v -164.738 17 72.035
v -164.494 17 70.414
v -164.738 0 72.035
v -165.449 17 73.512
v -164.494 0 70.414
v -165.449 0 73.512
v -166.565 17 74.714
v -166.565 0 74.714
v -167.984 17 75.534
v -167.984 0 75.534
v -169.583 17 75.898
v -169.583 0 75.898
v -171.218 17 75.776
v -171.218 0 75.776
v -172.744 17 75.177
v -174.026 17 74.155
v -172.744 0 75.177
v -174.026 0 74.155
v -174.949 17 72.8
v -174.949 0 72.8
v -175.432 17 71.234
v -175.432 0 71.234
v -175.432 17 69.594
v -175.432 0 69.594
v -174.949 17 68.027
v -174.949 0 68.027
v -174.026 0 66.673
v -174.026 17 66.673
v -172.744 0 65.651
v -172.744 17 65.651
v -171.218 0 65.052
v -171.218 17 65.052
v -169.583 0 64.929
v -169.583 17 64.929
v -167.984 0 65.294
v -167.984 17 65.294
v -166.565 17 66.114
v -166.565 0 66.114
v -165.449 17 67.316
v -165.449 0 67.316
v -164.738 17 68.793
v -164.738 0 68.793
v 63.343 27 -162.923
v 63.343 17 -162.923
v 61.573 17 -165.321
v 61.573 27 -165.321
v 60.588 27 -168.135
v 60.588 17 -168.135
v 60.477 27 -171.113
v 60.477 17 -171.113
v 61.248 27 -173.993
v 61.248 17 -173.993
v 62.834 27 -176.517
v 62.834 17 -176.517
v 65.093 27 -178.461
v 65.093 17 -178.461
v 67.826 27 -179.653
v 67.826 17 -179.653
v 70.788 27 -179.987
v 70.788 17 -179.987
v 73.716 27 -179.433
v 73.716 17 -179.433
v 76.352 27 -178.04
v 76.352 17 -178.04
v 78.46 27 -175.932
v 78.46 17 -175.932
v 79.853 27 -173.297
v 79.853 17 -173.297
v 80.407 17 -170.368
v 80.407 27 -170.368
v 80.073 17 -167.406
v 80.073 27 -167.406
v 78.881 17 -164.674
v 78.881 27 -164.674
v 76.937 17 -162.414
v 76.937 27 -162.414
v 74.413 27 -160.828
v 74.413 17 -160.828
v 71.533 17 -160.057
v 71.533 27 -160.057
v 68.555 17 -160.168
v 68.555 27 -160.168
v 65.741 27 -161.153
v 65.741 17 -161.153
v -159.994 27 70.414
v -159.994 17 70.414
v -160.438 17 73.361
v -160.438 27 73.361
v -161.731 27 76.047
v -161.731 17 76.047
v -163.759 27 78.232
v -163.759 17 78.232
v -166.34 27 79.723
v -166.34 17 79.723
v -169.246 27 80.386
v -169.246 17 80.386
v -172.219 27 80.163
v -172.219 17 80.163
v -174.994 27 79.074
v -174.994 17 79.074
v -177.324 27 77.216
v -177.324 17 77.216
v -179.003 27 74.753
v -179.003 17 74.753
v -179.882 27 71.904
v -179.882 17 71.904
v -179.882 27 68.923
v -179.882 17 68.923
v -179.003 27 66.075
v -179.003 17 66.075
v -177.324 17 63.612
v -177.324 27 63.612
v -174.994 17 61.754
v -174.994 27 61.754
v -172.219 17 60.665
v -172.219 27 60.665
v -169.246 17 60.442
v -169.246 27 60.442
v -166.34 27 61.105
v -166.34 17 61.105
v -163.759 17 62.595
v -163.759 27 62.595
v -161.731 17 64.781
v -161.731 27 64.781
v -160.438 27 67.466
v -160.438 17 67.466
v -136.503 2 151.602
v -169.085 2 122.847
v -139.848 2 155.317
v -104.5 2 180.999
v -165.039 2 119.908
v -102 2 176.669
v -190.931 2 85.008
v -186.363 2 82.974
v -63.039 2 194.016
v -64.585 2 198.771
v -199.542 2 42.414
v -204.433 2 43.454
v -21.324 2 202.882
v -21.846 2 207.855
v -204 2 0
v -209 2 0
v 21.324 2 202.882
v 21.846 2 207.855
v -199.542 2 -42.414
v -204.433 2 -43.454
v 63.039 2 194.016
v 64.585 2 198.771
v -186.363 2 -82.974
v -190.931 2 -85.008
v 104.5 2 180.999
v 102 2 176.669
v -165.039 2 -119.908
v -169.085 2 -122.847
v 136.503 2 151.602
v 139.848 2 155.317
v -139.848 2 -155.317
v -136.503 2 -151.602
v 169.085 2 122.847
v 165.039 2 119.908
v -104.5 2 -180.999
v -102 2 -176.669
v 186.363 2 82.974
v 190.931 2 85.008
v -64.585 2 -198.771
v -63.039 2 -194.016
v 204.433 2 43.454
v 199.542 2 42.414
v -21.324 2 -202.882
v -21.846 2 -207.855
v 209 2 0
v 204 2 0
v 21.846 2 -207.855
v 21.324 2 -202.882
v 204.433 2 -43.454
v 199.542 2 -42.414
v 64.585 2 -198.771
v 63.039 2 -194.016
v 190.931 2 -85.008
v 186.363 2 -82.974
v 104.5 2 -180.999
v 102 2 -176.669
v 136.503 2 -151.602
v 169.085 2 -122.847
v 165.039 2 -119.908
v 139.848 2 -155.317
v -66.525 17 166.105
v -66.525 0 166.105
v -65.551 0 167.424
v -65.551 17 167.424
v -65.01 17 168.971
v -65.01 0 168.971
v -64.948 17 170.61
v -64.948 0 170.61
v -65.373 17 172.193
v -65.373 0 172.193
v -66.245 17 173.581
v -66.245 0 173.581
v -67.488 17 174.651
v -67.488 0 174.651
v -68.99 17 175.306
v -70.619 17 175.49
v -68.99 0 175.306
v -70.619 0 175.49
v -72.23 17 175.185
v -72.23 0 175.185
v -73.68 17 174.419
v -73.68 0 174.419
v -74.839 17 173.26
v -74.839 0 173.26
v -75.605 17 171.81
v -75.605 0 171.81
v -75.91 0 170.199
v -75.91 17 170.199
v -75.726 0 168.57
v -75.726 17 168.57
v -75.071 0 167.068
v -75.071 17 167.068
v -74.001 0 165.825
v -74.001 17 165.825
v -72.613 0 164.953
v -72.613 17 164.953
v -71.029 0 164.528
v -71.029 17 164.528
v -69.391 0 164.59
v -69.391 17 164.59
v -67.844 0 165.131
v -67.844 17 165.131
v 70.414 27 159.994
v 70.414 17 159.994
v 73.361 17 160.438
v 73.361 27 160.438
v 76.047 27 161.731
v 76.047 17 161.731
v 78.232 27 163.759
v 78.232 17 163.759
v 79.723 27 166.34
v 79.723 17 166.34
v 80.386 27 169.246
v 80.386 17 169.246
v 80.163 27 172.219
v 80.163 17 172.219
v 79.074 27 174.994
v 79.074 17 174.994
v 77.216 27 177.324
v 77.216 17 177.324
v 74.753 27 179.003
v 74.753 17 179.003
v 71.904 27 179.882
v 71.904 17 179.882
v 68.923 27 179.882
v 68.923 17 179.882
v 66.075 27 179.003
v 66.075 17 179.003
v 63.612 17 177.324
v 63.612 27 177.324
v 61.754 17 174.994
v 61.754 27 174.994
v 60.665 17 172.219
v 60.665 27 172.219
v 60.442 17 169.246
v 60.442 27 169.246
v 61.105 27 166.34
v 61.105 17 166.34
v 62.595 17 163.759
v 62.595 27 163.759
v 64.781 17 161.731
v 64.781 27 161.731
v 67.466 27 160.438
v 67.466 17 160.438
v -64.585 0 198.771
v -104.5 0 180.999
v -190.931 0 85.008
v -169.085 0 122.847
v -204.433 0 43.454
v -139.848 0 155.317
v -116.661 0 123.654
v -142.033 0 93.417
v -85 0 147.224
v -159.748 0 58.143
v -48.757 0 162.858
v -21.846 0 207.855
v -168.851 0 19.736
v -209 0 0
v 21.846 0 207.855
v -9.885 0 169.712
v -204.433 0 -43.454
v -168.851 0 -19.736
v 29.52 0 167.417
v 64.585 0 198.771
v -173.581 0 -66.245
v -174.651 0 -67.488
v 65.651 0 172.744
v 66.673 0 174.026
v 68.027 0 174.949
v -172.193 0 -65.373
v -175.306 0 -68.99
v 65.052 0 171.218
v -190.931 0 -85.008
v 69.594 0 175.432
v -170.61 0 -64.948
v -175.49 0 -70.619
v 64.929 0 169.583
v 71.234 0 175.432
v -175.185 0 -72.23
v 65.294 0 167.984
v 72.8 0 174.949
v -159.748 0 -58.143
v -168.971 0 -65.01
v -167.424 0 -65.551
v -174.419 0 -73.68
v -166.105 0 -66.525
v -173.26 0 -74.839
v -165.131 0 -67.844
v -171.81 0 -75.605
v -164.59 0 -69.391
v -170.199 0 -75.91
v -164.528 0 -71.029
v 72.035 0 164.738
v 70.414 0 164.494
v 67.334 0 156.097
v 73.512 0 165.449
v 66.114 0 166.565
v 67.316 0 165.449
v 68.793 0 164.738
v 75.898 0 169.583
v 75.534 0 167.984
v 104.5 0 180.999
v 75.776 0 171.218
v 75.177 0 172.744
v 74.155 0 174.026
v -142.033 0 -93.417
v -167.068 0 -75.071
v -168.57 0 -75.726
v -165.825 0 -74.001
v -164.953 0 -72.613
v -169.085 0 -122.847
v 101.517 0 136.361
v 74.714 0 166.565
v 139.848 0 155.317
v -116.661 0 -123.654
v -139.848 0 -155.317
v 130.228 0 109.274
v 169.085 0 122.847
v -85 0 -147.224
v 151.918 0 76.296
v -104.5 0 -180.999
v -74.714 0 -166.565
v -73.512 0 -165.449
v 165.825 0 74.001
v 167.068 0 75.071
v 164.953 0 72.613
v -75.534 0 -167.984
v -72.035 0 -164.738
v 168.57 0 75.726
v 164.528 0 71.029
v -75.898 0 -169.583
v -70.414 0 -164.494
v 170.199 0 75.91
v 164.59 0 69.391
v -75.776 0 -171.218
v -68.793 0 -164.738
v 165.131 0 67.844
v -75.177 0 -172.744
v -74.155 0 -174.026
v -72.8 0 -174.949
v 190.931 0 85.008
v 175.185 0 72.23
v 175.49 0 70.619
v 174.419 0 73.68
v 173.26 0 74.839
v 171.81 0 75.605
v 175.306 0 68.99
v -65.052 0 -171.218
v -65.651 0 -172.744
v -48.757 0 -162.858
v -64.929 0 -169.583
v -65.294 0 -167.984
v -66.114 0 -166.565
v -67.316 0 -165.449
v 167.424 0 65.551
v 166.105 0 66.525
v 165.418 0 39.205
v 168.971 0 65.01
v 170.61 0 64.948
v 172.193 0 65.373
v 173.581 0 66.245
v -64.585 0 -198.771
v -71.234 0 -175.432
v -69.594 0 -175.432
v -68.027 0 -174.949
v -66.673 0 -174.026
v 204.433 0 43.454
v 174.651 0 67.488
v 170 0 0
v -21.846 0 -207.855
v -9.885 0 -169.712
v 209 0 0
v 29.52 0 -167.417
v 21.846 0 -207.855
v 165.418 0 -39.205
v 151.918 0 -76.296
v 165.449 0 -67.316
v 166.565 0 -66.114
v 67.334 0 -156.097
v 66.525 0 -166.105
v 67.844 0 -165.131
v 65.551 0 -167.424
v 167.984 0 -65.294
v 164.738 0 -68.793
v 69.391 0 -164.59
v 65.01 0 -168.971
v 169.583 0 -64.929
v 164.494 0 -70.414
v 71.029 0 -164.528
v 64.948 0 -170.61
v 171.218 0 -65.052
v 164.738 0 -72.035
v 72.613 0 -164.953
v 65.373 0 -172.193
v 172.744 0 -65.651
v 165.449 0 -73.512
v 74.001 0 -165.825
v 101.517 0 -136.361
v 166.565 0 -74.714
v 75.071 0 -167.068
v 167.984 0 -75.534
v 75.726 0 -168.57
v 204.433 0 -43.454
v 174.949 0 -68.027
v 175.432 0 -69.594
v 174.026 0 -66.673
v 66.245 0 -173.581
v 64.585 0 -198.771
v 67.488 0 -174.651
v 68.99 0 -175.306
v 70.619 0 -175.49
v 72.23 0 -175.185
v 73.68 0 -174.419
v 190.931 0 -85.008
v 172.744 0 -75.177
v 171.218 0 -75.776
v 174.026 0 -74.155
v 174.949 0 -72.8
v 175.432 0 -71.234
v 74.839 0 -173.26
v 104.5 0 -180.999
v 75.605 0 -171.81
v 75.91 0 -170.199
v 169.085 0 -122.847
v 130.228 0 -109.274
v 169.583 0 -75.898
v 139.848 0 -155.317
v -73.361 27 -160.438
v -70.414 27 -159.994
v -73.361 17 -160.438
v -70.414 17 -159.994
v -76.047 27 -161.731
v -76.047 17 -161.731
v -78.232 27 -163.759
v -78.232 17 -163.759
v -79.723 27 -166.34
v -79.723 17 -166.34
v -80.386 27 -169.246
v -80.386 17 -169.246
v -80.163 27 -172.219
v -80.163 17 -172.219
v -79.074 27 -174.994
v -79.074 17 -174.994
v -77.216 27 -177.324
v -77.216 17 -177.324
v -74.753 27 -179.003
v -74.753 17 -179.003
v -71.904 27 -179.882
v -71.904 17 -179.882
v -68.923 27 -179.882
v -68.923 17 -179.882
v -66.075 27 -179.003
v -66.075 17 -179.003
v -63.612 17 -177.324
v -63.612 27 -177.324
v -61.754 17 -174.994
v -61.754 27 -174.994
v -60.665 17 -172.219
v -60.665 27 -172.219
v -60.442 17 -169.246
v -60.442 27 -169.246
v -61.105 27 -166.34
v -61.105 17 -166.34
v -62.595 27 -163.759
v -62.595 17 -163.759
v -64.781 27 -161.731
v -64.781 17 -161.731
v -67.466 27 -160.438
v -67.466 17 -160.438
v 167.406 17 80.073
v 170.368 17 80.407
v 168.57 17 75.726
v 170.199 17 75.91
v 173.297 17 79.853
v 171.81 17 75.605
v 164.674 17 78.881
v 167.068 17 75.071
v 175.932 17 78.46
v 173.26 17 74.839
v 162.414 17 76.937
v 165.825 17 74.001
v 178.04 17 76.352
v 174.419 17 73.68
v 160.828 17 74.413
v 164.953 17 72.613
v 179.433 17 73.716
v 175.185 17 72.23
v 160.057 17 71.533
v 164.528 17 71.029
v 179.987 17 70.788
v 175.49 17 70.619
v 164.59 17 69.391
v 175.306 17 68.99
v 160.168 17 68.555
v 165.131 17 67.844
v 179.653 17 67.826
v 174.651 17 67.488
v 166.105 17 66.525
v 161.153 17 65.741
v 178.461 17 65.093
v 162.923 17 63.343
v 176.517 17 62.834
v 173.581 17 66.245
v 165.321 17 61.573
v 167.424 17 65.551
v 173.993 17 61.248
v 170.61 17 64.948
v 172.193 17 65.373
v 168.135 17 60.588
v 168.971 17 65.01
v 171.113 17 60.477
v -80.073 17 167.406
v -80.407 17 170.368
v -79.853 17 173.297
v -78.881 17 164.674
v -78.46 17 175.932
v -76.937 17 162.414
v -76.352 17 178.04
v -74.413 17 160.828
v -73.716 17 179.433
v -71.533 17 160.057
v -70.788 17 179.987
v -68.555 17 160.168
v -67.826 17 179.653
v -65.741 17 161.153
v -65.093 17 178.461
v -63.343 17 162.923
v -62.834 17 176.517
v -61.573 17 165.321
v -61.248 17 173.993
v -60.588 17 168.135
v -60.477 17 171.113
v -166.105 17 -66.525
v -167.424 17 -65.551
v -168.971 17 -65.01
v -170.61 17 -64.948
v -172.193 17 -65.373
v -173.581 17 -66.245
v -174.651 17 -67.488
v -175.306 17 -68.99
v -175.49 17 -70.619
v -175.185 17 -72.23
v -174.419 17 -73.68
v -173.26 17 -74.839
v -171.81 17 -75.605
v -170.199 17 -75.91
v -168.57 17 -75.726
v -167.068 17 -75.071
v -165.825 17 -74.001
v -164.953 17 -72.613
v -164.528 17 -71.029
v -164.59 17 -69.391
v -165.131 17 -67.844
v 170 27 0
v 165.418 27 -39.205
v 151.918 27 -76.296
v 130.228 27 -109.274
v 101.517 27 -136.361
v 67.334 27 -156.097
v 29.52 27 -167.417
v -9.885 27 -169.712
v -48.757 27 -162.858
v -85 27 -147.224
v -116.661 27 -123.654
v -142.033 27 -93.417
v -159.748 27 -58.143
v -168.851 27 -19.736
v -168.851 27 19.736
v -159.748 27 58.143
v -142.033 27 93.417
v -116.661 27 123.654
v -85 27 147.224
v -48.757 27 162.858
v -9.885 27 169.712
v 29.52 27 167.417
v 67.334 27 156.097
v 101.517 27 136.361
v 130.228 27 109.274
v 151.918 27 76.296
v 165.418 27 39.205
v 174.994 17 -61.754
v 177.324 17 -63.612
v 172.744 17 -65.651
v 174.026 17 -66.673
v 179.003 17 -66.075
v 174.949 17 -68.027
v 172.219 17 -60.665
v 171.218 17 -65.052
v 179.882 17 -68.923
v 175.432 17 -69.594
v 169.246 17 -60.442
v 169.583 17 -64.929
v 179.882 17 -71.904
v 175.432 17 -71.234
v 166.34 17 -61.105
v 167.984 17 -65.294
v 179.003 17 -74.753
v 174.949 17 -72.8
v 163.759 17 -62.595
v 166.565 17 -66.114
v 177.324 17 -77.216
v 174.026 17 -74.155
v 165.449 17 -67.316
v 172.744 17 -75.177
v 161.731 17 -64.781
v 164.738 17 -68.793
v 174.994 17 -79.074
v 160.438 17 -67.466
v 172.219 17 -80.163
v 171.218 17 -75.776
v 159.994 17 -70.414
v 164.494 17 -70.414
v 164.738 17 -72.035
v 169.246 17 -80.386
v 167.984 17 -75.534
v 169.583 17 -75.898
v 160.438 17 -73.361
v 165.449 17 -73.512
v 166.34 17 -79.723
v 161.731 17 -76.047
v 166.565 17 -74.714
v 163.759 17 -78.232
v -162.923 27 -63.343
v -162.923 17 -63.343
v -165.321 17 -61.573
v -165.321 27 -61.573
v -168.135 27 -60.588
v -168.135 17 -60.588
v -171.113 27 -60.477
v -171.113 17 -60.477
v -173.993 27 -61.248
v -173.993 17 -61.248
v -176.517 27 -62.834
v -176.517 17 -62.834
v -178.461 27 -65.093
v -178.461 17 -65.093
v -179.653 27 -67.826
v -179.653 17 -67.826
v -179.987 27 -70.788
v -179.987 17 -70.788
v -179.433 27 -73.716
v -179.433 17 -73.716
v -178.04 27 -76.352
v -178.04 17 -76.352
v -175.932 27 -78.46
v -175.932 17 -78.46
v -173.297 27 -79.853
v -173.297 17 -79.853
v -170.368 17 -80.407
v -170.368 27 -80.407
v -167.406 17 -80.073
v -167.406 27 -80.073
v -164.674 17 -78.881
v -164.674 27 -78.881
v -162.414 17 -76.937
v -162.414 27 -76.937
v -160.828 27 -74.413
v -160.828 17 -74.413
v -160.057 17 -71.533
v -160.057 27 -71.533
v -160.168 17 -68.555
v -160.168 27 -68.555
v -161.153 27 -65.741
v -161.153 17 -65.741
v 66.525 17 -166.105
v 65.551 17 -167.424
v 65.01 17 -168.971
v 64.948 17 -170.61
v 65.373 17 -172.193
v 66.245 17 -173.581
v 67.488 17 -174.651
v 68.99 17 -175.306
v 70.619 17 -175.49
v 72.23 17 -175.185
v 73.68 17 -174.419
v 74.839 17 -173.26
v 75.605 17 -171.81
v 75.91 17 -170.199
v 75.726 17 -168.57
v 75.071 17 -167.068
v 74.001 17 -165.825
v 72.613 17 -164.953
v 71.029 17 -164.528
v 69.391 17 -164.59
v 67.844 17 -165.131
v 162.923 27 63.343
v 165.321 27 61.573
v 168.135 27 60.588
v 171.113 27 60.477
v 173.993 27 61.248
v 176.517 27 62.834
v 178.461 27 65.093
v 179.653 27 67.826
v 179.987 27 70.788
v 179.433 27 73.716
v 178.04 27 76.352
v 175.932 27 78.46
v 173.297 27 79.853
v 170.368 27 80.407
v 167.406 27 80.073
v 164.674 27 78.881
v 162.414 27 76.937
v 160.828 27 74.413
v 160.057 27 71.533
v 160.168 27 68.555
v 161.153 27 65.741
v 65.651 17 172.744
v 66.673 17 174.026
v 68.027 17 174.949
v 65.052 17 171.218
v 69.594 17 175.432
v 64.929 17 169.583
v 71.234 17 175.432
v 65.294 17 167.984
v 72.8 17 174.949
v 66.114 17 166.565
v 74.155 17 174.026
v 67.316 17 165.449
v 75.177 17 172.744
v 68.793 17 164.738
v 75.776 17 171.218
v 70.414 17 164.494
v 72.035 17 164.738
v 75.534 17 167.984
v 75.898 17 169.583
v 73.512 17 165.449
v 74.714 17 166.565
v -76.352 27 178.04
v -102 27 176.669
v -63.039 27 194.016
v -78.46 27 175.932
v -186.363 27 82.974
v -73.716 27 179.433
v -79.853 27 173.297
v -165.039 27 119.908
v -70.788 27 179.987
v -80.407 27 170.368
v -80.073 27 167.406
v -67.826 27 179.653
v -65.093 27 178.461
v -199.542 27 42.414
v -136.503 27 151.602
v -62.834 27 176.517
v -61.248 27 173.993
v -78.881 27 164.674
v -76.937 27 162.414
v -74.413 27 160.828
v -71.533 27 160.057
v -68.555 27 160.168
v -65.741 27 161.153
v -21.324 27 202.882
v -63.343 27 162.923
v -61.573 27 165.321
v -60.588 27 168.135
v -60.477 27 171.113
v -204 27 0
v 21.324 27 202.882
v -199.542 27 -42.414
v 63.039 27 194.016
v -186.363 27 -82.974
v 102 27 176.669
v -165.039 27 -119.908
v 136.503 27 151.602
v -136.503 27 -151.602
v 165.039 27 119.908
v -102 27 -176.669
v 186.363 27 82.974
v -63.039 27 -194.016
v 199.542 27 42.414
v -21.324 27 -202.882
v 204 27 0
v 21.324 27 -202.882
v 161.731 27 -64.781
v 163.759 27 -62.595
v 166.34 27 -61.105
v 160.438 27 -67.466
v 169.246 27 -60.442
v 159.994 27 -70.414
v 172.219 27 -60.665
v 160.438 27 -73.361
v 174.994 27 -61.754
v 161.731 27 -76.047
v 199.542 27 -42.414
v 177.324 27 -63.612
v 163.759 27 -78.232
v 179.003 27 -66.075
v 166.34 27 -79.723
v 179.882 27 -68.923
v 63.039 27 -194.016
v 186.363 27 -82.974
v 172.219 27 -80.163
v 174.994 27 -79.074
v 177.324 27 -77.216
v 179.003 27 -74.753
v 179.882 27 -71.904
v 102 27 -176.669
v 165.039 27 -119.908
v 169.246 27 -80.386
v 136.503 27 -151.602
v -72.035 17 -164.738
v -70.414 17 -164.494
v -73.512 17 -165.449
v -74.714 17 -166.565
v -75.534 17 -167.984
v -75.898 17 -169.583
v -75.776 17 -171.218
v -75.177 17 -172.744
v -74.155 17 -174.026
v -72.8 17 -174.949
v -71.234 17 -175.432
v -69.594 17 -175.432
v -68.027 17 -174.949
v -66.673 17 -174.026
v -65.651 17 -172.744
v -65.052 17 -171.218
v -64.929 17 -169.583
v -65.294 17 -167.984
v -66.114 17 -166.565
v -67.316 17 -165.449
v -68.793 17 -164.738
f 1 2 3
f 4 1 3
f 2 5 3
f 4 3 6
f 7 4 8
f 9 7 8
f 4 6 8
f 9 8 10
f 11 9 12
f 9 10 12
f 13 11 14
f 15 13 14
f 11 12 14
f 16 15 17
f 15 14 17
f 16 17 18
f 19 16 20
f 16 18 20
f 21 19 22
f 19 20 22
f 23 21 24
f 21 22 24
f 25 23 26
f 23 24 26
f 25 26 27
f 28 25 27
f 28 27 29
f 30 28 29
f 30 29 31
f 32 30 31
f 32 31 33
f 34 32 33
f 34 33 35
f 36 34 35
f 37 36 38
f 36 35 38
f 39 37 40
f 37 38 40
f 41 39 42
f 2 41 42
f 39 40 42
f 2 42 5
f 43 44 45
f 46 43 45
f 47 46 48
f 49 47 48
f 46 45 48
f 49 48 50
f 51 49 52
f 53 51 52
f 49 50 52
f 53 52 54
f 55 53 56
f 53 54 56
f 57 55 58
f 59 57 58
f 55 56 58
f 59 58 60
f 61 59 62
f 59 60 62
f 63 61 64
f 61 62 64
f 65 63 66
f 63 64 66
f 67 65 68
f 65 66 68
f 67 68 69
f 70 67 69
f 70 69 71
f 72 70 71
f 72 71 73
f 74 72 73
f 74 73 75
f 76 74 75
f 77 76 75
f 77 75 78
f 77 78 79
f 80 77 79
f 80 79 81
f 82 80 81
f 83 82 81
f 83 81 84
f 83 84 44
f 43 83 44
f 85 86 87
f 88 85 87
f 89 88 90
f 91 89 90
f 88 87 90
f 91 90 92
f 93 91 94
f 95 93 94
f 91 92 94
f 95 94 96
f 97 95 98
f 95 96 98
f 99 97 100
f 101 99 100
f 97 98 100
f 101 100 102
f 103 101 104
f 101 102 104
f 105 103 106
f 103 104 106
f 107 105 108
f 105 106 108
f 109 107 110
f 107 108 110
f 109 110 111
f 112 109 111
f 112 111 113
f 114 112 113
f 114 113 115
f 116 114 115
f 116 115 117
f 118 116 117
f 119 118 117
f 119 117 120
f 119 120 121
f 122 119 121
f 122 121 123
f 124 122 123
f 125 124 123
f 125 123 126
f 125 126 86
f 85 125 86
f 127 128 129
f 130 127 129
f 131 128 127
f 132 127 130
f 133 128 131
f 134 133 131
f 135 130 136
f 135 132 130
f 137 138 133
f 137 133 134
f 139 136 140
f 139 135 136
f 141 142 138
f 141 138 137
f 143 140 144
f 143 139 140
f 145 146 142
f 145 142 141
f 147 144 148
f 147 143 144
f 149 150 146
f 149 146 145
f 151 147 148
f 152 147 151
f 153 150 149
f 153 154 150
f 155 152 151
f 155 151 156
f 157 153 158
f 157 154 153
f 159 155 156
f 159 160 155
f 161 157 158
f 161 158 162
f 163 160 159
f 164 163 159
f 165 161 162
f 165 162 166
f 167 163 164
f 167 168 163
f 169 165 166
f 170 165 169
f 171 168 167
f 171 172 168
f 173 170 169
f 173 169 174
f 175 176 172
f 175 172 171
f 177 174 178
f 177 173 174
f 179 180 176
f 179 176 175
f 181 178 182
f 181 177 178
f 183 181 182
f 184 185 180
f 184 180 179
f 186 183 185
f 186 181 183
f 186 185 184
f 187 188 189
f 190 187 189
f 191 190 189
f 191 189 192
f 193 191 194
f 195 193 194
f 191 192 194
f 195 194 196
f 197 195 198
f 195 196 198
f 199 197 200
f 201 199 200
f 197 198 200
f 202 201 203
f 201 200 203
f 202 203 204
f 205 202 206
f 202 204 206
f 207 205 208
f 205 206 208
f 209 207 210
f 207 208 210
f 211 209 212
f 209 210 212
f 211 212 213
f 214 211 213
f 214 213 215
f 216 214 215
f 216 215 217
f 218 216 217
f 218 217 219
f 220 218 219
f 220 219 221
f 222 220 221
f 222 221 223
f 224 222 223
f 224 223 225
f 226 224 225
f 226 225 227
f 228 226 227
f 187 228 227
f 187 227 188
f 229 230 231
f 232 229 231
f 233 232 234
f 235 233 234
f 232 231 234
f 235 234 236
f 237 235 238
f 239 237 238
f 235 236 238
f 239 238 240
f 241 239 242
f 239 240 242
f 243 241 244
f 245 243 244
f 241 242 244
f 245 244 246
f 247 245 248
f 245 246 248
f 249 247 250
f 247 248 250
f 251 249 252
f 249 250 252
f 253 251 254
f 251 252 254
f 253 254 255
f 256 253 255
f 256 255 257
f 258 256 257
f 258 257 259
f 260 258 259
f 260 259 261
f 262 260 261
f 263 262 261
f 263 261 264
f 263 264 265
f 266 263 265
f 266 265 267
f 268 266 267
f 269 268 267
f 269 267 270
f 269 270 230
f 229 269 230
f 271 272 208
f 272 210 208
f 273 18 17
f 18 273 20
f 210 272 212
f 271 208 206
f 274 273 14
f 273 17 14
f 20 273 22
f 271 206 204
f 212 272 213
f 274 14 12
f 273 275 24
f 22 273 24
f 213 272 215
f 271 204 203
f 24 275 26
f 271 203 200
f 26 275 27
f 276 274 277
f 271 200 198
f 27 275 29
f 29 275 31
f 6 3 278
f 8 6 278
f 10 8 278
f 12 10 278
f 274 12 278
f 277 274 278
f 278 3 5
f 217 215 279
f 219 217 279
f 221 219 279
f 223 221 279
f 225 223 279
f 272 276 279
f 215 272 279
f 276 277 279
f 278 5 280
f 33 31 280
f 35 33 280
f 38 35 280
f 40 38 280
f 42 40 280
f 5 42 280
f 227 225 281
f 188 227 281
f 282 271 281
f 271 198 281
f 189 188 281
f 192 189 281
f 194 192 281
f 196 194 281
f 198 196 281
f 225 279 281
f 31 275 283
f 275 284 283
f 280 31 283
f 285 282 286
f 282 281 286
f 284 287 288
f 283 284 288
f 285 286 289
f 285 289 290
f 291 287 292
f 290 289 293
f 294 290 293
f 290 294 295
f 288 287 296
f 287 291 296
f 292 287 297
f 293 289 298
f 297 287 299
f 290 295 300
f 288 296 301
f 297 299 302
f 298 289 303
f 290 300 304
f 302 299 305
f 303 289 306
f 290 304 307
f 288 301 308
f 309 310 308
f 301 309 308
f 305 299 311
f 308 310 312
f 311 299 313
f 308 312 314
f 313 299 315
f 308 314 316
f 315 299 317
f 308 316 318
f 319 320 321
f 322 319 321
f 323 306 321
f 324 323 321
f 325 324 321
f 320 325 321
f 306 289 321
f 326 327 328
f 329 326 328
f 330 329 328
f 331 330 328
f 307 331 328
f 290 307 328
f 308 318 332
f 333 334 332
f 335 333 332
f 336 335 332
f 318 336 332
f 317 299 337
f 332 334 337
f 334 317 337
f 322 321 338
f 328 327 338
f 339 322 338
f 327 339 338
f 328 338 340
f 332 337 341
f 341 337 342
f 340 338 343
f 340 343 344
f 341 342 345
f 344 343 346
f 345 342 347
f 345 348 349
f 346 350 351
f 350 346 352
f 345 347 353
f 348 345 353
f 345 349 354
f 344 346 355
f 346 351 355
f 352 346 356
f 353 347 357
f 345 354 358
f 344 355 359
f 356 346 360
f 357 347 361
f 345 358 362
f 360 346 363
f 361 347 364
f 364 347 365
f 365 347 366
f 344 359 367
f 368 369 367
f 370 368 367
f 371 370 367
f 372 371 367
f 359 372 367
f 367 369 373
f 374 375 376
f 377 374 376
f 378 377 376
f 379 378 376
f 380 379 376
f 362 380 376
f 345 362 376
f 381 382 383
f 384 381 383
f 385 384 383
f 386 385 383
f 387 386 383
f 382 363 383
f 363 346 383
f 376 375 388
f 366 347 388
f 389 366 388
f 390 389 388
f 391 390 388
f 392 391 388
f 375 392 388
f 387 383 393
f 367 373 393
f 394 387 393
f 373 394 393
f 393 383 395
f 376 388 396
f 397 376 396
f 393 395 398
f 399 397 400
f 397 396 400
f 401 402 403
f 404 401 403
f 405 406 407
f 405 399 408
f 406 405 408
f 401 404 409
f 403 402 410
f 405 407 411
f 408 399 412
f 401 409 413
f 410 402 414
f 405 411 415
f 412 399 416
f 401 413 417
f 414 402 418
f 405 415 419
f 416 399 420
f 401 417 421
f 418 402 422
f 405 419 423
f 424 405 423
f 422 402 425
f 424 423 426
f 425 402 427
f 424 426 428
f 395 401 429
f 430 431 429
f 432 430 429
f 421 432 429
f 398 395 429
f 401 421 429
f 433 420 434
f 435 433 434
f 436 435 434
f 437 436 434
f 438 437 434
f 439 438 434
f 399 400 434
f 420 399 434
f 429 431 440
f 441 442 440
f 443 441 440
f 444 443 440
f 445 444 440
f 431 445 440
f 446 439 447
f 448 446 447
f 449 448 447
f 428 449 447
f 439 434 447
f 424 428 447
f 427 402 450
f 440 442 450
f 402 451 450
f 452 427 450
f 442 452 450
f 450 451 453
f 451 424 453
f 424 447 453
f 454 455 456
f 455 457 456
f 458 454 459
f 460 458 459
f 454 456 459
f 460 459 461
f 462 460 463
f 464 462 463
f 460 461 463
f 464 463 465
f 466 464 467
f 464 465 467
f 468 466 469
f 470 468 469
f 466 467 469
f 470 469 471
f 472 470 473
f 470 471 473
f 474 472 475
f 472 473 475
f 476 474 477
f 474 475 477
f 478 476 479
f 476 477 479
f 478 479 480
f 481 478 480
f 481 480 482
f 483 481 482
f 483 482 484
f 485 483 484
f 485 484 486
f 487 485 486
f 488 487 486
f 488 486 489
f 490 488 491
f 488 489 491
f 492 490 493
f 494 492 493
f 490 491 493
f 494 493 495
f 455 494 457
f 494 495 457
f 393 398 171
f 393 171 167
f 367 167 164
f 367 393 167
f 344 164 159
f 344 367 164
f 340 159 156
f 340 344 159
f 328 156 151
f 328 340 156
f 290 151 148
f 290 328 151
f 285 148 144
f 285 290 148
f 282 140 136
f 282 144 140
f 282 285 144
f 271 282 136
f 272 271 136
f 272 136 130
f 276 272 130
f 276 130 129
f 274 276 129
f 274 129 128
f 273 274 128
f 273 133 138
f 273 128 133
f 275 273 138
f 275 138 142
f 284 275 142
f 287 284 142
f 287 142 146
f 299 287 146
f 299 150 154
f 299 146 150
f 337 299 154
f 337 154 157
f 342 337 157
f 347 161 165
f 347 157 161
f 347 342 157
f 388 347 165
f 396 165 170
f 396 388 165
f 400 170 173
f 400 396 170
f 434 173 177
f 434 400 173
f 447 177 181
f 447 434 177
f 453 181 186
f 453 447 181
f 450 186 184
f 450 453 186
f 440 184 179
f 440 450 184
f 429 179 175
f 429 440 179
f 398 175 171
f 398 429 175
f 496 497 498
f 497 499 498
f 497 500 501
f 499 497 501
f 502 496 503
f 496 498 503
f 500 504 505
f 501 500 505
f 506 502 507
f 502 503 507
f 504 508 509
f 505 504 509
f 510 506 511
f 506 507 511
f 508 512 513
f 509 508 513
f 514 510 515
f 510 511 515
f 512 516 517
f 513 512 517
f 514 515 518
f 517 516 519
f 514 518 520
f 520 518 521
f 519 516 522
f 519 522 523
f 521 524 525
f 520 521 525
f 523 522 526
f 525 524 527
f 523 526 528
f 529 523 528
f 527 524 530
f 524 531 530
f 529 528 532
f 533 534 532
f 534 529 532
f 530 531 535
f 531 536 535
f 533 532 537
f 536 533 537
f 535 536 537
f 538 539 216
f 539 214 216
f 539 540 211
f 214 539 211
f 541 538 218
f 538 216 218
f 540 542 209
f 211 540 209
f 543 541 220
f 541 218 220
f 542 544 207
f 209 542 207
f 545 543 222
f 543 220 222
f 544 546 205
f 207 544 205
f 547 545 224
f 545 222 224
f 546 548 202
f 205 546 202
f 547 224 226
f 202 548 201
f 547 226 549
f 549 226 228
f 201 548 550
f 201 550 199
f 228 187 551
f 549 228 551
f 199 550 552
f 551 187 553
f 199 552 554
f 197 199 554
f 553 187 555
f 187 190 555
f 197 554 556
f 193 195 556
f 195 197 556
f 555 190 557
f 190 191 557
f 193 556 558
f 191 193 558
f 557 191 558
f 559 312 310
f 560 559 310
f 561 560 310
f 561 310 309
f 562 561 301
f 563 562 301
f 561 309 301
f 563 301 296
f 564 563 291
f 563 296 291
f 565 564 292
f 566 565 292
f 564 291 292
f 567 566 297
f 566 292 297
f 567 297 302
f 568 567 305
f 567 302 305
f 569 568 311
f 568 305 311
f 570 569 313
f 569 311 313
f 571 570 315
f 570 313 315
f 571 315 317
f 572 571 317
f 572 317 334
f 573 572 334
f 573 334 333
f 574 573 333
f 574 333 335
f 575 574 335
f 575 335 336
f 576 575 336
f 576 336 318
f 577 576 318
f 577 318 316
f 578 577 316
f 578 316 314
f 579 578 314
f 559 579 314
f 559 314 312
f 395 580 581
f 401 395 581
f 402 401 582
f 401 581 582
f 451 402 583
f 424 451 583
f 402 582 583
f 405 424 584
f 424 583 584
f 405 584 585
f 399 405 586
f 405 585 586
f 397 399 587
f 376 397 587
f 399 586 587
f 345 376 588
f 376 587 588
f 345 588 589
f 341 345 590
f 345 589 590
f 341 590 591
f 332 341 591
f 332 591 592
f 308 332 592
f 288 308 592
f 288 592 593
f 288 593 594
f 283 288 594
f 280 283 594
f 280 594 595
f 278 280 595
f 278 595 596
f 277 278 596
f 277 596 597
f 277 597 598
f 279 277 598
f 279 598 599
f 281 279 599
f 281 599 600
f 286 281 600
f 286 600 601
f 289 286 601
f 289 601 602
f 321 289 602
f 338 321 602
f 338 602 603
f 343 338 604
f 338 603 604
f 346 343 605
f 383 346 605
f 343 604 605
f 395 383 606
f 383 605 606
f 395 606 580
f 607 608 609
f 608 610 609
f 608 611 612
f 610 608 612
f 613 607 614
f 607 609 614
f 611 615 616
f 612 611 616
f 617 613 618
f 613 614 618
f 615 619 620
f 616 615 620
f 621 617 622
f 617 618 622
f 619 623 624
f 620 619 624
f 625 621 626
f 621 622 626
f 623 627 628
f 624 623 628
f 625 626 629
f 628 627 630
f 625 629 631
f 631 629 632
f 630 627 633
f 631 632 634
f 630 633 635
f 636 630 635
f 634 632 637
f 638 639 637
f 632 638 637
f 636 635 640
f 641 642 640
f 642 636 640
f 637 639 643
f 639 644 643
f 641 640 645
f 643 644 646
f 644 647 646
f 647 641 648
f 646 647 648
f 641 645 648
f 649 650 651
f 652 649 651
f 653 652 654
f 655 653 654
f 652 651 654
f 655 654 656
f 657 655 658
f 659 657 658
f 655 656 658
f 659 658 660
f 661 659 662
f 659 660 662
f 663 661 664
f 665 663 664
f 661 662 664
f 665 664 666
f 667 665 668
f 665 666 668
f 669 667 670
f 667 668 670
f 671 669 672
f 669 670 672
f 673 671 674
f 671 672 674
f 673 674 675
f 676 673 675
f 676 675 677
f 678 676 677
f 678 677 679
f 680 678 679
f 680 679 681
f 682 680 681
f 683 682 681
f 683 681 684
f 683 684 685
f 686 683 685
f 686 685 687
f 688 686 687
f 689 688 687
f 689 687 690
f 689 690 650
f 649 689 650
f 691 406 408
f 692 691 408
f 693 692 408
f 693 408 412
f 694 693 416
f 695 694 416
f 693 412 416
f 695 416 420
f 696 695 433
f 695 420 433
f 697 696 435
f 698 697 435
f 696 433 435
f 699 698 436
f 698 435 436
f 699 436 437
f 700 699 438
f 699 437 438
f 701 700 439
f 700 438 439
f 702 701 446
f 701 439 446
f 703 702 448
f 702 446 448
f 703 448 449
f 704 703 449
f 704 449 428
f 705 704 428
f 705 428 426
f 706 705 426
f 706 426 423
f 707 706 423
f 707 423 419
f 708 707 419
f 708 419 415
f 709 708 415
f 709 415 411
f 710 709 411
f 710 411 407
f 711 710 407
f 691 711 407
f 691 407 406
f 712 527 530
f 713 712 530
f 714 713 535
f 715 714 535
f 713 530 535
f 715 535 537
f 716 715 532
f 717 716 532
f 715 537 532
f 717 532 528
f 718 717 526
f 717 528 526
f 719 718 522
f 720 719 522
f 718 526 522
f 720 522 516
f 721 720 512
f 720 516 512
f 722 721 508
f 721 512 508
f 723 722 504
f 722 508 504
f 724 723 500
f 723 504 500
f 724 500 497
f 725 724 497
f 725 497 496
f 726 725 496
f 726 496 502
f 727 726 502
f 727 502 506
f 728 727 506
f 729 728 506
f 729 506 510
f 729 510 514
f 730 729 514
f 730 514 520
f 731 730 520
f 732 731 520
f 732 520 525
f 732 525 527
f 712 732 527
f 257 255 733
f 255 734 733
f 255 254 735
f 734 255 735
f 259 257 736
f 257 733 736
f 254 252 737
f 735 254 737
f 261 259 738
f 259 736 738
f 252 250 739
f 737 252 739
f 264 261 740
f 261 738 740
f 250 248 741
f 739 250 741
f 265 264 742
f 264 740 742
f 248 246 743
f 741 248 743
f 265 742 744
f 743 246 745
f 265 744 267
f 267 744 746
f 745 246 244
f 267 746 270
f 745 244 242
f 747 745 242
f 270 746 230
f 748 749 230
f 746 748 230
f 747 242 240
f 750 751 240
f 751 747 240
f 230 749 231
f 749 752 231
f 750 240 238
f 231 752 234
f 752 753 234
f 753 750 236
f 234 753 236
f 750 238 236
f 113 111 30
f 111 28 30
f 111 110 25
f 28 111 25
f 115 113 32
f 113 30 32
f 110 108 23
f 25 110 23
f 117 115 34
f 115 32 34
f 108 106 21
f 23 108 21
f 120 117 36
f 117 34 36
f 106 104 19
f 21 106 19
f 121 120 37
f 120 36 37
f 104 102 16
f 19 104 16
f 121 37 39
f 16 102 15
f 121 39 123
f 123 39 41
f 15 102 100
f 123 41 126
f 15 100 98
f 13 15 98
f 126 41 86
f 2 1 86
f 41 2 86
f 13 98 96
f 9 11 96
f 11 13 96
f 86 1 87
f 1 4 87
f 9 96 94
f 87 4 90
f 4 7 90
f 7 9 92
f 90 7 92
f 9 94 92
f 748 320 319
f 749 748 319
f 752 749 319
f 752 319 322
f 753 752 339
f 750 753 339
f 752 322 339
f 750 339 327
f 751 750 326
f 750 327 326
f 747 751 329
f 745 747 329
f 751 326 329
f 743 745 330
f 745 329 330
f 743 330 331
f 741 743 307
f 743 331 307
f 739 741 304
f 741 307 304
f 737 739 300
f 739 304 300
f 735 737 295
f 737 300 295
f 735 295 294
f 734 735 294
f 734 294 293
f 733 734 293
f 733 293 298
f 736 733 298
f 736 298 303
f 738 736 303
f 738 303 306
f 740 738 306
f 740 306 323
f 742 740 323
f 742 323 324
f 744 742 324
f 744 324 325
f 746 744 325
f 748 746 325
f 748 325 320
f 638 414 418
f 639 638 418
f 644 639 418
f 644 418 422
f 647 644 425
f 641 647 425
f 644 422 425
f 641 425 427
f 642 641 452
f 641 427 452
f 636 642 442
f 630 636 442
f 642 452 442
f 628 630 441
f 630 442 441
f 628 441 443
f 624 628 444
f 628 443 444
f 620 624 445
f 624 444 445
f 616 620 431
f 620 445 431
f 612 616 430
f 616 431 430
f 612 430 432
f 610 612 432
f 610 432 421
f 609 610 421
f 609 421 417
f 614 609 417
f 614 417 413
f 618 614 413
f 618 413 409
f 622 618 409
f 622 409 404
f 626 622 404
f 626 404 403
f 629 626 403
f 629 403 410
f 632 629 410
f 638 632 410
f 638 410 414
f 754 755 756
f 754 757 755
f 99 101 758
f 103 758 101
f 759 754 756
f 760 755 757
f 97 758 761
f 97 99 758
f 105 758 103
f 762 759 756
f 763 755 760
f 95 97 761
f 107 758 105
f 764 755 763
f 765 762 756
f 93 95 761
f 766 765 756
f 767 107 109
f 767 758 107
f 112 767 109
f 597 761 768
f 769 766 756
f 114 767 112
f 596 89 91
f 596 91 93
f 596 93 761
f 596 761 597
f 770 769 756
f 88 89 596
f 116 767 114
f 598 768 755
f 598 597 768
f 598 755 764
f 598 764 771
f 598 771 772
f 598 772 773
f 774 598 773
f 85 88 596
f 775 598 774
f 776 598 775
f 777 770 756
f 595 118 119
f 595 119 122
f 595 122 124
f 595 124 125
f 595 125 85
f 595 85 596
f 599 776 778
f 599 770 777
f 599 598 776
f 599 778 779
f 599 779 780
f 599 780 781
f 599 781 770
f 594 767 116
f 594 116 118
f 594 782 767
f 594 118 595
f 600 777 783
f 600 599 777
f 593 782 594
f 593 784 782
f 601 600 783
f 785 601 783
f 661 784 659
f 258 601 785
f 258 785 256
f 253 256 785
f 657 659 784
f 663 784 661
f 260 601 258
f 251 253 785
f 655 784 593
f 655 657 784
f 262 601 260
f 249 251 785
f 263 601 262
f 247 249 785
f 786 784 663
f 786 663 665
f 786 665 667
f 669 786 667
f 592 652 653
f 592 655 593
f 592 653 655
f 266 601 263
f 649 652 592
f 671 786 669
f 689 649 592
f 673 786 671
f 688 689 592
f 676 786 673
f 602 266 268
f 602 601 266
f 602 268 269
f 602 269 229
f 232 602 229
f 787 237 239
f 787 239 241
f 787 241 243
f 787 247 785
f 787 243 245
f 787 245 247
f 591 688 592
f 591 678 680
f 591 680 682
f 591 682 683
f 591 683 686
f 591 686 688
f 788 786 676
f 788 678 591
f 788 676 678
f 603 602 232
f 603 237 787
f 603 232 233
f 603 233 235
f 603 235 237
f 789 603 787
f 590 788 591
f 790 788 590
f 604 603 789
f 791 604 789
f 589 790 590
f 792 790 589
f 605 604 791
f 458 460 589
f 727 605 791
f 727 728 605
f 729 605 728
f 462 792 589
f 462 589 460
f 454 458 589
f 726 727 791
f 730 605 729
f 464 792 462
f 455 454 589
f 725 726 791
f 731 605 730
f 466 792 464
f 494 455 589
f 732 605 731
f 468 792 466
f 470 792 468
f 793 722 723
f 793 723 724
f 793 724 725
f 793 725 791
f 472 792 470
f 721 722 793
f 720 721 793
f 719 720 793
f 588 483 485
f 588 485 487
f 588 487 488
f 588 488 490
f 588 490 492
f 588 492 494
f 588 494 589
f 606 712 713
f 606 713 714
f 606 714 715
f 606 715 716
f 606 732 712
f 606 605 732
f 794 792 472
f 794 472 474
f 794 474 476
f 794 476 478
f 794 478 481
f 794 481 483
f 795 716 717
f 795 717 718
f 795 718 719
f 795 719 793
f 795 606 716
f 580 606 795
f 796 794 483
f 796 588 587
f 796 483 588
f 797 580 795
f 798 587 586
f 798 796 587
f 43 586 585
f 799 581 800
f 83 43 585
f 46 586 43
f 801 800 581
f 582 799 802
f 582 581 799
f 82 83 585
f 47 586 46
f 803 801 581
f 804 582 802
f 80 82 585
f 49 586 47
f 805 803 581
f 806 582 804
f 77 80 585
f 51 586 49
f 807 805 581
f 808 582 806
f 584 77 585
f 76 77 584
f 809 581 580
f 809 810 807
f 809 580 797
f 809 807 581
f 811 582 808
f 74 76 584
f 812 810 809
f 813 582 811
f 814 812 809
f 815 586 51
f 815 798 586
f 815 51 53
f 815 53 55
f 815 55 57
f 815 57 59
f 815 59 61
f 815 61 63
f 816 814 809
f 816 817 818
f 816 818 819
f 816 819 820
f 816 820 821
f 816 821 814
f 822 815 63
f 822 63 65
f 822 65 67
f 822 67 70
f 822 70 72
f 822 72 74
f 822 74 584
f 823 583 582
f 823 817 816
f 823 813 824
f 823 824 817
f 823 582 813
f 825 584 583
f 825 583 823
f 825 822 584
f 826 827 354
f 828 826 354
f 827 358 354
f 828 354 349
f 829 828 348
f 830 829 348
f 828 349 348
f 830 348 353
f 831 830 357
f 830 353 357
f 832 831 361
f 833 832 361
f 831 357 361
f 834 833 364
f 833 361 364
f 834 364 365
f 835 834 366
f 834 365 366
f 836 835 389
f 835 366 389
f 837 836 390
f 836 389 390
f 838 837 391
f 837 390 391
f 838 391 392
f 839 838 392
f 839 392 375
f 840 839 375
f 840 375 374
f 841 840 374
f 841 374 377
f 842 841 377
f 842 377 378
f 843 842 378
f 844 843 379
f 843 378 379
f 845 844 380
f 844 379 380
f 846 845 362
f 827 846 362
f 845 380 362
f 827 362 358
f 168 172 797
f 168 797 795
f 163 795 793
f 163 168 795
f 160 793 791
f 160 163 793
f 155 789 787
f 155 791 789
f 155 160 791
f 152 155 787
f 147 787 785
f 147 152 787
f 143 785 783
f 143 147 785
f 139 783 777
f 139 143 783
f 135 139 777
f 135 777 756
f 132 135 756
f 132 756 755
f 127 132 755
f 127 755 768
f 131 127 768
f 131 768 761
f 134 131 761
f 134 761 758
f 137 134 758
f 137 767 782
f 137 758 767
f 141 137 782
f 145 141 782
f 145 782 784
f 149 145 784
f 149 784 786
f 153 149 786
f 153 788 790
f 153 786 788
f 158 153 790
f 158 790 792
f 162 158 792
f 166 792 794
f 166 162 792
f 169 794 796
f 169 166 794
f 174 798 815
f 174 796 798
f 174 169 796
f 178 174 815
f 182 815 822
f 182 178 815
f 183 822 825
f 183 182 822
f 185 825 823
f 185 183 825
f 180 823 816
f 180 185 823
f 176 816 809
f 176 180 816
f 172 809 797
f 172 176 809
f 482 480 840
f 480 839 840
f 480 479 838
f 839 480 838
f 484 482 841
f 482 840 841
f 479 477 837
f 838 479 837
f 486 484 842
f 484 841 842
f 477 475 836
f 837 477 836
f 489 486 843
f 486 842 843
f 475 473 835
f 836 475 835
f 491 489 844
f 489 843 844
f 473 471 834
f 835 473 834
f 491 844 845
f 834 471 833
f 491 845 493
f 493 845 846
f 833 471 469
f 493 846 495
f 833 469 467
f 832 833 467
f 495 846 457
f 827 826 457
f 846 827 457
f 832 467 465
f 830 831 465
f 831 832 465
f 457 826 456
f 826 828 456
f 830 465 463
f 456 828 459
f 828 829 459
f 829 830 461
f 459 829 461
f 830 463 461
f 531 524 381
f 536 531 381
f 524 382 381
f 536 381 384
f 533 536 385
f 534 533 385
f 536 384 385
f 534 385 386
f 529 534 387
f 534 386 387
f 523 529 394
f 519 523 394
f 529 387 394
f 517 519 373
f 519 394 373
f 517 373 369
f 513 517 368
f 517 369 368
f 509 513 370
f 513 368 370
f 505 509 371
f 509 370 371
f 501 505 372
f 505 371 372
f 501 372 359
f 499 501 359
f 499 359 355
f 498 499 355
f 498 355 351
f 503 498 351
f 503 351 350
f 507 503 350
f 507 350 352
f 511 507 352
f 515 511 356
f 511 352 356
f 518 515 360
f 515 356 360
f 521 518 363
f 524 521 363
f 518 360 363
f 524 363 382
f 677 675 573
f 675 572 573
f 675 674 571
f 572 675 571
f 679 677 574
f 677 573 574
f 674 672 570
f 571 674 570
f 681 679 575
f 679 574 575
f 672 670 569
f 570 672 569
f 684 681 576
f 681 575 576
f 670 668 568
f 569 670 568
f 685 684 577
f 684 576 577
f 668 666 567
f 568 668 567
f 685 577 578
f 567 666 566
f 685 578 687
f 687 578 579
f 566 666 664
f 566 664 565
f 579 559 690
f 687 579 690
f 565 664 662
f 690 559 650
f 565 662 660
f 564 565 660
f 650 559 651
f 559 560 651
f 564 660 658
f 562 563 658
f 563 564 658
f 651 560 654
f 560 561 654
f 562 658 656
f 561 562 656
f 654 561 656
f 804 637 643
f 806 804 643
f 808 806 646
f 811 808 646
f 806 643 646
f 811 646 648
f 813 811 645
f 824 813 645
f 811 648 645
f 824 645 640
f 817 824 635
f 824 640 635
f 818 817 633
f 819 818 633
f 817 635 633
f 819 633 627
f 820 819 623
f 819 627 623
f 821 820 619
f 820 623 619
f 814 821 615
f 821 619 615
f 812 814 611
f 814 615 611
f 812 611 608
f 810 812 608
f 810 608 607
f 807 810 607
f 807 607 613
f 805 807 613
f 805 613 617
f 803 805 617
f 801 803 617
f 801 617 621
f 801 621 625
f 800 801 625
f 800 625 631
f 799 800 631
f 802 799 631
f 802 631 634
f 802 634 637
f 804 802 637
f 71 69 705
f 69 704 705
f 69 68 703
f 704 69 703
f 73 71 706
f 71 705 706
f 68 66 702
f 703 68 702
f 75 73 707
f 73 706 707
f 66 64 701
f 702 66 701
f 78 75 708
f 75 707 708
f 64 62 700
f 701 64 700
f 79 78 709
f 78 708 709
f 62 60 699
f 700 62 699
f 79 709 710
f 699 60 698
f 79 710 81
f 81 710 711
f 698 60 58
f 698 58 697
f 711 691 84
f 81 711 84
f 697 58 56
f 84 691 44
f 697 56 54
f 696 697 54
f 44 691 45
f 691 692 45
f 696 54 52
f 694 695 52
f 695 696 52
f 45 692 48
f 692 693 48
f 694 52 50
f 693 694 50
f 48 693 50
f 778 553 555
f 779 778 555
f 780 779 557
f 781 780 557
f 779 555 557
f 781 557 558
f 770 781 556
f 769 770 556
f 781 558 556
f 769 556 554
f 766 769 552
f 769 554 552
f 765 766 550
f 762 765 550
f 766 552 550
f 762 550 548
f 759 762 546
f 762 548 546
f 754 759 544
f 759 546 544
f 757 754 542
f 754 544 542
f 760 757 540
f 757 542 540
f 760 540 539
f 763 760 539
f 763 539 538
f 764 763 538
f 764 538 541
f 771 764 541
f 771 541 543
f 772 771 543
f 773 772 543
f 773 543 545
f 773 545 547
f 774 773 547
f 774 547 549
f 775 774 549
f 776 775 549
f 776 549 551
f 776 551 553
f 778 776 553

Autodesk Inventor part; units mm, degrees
ref_plane "YZ Plane" through (0, 0, 0) normal (1, 0, 0) x (0, 1, 0)
ref_plane "XZ Plane" through (0, 0, 0) normal (0, 1, 0) x (-1, 0, 0)
ref_plane "XY Plane" through (0, 0, 0) normal (0, 0, 1) x (1, 0, 0)
sketch "Sketch5" plane through (0, 0, 0) normal (0, 0, 1) x (1, 0, 0)
  line L0 (0, 0) -> (0, 27)
  line L1 (170, 0) -> (170, 27)
  line L2 (170, 27) -> (204, 27)
  line L3 (204, 27) -> (204, 2)
  line L4 (204, 2) -> (209, 2)
  line L5 (209, 2) -> (209, 0)
  line L6 (209, 0) -> (170, 0)
  point P0 (189.5, 0)
  dimension "d16" = 340
  dimension "d17" = 408
  dimension "d19" = 25
  dimension "d20" = 2
  dimension "d21" = 5
revolve "Revolution1" add sketch "Sketch5" angle 360 about axis through (0, 0, 0) along (0, 1, 0)
sketch "Sketch6" plane through (0, 27, 0) normal (0, 1, 0) x (1, 0, 0)
  circle A0 centre (0, 0) radius 184
  line L0 (0, 0) -> (-70.4138, 169.9938)
  line L1 (0, 0) -> (0, 184)
  dimension "d23" = 368
  dimension "d34" = 22.5
hole "Hole1" at (-70.4138, 27, -169.9938) direction (0, -1, 0) diameter 11 end through all counterbore diameter 20 counterbore depth 10
pattern_circular "Circular Pattern2" count 8 over 360 about axis through (0, -10, 0) along (0, 1, 0) of "Hole1"
sketch "Sketch7" plane through (0, 0, 0) normal (0, 1, 0) x (-1, 0, 0)
  circle A0 centre (0, 0) radius 209 projected
  circle A1 centre (0, 0) radius 170 projected
  line L0 (0, 0) -> (0, -209)
  line L1 (0, 0) -> (-209, 0)
  point P0 (-170, 0)
  point P1 (0, -170)
  dimension "d35" = 90
extrude "Extrusion5" [suppressed]
equation "\"d29\" = Thickness"
equation "\"Thickness\" = 40"
properties part number "DMF 01 33 Барабан Опорное кольцо КОРМА v2.5"
